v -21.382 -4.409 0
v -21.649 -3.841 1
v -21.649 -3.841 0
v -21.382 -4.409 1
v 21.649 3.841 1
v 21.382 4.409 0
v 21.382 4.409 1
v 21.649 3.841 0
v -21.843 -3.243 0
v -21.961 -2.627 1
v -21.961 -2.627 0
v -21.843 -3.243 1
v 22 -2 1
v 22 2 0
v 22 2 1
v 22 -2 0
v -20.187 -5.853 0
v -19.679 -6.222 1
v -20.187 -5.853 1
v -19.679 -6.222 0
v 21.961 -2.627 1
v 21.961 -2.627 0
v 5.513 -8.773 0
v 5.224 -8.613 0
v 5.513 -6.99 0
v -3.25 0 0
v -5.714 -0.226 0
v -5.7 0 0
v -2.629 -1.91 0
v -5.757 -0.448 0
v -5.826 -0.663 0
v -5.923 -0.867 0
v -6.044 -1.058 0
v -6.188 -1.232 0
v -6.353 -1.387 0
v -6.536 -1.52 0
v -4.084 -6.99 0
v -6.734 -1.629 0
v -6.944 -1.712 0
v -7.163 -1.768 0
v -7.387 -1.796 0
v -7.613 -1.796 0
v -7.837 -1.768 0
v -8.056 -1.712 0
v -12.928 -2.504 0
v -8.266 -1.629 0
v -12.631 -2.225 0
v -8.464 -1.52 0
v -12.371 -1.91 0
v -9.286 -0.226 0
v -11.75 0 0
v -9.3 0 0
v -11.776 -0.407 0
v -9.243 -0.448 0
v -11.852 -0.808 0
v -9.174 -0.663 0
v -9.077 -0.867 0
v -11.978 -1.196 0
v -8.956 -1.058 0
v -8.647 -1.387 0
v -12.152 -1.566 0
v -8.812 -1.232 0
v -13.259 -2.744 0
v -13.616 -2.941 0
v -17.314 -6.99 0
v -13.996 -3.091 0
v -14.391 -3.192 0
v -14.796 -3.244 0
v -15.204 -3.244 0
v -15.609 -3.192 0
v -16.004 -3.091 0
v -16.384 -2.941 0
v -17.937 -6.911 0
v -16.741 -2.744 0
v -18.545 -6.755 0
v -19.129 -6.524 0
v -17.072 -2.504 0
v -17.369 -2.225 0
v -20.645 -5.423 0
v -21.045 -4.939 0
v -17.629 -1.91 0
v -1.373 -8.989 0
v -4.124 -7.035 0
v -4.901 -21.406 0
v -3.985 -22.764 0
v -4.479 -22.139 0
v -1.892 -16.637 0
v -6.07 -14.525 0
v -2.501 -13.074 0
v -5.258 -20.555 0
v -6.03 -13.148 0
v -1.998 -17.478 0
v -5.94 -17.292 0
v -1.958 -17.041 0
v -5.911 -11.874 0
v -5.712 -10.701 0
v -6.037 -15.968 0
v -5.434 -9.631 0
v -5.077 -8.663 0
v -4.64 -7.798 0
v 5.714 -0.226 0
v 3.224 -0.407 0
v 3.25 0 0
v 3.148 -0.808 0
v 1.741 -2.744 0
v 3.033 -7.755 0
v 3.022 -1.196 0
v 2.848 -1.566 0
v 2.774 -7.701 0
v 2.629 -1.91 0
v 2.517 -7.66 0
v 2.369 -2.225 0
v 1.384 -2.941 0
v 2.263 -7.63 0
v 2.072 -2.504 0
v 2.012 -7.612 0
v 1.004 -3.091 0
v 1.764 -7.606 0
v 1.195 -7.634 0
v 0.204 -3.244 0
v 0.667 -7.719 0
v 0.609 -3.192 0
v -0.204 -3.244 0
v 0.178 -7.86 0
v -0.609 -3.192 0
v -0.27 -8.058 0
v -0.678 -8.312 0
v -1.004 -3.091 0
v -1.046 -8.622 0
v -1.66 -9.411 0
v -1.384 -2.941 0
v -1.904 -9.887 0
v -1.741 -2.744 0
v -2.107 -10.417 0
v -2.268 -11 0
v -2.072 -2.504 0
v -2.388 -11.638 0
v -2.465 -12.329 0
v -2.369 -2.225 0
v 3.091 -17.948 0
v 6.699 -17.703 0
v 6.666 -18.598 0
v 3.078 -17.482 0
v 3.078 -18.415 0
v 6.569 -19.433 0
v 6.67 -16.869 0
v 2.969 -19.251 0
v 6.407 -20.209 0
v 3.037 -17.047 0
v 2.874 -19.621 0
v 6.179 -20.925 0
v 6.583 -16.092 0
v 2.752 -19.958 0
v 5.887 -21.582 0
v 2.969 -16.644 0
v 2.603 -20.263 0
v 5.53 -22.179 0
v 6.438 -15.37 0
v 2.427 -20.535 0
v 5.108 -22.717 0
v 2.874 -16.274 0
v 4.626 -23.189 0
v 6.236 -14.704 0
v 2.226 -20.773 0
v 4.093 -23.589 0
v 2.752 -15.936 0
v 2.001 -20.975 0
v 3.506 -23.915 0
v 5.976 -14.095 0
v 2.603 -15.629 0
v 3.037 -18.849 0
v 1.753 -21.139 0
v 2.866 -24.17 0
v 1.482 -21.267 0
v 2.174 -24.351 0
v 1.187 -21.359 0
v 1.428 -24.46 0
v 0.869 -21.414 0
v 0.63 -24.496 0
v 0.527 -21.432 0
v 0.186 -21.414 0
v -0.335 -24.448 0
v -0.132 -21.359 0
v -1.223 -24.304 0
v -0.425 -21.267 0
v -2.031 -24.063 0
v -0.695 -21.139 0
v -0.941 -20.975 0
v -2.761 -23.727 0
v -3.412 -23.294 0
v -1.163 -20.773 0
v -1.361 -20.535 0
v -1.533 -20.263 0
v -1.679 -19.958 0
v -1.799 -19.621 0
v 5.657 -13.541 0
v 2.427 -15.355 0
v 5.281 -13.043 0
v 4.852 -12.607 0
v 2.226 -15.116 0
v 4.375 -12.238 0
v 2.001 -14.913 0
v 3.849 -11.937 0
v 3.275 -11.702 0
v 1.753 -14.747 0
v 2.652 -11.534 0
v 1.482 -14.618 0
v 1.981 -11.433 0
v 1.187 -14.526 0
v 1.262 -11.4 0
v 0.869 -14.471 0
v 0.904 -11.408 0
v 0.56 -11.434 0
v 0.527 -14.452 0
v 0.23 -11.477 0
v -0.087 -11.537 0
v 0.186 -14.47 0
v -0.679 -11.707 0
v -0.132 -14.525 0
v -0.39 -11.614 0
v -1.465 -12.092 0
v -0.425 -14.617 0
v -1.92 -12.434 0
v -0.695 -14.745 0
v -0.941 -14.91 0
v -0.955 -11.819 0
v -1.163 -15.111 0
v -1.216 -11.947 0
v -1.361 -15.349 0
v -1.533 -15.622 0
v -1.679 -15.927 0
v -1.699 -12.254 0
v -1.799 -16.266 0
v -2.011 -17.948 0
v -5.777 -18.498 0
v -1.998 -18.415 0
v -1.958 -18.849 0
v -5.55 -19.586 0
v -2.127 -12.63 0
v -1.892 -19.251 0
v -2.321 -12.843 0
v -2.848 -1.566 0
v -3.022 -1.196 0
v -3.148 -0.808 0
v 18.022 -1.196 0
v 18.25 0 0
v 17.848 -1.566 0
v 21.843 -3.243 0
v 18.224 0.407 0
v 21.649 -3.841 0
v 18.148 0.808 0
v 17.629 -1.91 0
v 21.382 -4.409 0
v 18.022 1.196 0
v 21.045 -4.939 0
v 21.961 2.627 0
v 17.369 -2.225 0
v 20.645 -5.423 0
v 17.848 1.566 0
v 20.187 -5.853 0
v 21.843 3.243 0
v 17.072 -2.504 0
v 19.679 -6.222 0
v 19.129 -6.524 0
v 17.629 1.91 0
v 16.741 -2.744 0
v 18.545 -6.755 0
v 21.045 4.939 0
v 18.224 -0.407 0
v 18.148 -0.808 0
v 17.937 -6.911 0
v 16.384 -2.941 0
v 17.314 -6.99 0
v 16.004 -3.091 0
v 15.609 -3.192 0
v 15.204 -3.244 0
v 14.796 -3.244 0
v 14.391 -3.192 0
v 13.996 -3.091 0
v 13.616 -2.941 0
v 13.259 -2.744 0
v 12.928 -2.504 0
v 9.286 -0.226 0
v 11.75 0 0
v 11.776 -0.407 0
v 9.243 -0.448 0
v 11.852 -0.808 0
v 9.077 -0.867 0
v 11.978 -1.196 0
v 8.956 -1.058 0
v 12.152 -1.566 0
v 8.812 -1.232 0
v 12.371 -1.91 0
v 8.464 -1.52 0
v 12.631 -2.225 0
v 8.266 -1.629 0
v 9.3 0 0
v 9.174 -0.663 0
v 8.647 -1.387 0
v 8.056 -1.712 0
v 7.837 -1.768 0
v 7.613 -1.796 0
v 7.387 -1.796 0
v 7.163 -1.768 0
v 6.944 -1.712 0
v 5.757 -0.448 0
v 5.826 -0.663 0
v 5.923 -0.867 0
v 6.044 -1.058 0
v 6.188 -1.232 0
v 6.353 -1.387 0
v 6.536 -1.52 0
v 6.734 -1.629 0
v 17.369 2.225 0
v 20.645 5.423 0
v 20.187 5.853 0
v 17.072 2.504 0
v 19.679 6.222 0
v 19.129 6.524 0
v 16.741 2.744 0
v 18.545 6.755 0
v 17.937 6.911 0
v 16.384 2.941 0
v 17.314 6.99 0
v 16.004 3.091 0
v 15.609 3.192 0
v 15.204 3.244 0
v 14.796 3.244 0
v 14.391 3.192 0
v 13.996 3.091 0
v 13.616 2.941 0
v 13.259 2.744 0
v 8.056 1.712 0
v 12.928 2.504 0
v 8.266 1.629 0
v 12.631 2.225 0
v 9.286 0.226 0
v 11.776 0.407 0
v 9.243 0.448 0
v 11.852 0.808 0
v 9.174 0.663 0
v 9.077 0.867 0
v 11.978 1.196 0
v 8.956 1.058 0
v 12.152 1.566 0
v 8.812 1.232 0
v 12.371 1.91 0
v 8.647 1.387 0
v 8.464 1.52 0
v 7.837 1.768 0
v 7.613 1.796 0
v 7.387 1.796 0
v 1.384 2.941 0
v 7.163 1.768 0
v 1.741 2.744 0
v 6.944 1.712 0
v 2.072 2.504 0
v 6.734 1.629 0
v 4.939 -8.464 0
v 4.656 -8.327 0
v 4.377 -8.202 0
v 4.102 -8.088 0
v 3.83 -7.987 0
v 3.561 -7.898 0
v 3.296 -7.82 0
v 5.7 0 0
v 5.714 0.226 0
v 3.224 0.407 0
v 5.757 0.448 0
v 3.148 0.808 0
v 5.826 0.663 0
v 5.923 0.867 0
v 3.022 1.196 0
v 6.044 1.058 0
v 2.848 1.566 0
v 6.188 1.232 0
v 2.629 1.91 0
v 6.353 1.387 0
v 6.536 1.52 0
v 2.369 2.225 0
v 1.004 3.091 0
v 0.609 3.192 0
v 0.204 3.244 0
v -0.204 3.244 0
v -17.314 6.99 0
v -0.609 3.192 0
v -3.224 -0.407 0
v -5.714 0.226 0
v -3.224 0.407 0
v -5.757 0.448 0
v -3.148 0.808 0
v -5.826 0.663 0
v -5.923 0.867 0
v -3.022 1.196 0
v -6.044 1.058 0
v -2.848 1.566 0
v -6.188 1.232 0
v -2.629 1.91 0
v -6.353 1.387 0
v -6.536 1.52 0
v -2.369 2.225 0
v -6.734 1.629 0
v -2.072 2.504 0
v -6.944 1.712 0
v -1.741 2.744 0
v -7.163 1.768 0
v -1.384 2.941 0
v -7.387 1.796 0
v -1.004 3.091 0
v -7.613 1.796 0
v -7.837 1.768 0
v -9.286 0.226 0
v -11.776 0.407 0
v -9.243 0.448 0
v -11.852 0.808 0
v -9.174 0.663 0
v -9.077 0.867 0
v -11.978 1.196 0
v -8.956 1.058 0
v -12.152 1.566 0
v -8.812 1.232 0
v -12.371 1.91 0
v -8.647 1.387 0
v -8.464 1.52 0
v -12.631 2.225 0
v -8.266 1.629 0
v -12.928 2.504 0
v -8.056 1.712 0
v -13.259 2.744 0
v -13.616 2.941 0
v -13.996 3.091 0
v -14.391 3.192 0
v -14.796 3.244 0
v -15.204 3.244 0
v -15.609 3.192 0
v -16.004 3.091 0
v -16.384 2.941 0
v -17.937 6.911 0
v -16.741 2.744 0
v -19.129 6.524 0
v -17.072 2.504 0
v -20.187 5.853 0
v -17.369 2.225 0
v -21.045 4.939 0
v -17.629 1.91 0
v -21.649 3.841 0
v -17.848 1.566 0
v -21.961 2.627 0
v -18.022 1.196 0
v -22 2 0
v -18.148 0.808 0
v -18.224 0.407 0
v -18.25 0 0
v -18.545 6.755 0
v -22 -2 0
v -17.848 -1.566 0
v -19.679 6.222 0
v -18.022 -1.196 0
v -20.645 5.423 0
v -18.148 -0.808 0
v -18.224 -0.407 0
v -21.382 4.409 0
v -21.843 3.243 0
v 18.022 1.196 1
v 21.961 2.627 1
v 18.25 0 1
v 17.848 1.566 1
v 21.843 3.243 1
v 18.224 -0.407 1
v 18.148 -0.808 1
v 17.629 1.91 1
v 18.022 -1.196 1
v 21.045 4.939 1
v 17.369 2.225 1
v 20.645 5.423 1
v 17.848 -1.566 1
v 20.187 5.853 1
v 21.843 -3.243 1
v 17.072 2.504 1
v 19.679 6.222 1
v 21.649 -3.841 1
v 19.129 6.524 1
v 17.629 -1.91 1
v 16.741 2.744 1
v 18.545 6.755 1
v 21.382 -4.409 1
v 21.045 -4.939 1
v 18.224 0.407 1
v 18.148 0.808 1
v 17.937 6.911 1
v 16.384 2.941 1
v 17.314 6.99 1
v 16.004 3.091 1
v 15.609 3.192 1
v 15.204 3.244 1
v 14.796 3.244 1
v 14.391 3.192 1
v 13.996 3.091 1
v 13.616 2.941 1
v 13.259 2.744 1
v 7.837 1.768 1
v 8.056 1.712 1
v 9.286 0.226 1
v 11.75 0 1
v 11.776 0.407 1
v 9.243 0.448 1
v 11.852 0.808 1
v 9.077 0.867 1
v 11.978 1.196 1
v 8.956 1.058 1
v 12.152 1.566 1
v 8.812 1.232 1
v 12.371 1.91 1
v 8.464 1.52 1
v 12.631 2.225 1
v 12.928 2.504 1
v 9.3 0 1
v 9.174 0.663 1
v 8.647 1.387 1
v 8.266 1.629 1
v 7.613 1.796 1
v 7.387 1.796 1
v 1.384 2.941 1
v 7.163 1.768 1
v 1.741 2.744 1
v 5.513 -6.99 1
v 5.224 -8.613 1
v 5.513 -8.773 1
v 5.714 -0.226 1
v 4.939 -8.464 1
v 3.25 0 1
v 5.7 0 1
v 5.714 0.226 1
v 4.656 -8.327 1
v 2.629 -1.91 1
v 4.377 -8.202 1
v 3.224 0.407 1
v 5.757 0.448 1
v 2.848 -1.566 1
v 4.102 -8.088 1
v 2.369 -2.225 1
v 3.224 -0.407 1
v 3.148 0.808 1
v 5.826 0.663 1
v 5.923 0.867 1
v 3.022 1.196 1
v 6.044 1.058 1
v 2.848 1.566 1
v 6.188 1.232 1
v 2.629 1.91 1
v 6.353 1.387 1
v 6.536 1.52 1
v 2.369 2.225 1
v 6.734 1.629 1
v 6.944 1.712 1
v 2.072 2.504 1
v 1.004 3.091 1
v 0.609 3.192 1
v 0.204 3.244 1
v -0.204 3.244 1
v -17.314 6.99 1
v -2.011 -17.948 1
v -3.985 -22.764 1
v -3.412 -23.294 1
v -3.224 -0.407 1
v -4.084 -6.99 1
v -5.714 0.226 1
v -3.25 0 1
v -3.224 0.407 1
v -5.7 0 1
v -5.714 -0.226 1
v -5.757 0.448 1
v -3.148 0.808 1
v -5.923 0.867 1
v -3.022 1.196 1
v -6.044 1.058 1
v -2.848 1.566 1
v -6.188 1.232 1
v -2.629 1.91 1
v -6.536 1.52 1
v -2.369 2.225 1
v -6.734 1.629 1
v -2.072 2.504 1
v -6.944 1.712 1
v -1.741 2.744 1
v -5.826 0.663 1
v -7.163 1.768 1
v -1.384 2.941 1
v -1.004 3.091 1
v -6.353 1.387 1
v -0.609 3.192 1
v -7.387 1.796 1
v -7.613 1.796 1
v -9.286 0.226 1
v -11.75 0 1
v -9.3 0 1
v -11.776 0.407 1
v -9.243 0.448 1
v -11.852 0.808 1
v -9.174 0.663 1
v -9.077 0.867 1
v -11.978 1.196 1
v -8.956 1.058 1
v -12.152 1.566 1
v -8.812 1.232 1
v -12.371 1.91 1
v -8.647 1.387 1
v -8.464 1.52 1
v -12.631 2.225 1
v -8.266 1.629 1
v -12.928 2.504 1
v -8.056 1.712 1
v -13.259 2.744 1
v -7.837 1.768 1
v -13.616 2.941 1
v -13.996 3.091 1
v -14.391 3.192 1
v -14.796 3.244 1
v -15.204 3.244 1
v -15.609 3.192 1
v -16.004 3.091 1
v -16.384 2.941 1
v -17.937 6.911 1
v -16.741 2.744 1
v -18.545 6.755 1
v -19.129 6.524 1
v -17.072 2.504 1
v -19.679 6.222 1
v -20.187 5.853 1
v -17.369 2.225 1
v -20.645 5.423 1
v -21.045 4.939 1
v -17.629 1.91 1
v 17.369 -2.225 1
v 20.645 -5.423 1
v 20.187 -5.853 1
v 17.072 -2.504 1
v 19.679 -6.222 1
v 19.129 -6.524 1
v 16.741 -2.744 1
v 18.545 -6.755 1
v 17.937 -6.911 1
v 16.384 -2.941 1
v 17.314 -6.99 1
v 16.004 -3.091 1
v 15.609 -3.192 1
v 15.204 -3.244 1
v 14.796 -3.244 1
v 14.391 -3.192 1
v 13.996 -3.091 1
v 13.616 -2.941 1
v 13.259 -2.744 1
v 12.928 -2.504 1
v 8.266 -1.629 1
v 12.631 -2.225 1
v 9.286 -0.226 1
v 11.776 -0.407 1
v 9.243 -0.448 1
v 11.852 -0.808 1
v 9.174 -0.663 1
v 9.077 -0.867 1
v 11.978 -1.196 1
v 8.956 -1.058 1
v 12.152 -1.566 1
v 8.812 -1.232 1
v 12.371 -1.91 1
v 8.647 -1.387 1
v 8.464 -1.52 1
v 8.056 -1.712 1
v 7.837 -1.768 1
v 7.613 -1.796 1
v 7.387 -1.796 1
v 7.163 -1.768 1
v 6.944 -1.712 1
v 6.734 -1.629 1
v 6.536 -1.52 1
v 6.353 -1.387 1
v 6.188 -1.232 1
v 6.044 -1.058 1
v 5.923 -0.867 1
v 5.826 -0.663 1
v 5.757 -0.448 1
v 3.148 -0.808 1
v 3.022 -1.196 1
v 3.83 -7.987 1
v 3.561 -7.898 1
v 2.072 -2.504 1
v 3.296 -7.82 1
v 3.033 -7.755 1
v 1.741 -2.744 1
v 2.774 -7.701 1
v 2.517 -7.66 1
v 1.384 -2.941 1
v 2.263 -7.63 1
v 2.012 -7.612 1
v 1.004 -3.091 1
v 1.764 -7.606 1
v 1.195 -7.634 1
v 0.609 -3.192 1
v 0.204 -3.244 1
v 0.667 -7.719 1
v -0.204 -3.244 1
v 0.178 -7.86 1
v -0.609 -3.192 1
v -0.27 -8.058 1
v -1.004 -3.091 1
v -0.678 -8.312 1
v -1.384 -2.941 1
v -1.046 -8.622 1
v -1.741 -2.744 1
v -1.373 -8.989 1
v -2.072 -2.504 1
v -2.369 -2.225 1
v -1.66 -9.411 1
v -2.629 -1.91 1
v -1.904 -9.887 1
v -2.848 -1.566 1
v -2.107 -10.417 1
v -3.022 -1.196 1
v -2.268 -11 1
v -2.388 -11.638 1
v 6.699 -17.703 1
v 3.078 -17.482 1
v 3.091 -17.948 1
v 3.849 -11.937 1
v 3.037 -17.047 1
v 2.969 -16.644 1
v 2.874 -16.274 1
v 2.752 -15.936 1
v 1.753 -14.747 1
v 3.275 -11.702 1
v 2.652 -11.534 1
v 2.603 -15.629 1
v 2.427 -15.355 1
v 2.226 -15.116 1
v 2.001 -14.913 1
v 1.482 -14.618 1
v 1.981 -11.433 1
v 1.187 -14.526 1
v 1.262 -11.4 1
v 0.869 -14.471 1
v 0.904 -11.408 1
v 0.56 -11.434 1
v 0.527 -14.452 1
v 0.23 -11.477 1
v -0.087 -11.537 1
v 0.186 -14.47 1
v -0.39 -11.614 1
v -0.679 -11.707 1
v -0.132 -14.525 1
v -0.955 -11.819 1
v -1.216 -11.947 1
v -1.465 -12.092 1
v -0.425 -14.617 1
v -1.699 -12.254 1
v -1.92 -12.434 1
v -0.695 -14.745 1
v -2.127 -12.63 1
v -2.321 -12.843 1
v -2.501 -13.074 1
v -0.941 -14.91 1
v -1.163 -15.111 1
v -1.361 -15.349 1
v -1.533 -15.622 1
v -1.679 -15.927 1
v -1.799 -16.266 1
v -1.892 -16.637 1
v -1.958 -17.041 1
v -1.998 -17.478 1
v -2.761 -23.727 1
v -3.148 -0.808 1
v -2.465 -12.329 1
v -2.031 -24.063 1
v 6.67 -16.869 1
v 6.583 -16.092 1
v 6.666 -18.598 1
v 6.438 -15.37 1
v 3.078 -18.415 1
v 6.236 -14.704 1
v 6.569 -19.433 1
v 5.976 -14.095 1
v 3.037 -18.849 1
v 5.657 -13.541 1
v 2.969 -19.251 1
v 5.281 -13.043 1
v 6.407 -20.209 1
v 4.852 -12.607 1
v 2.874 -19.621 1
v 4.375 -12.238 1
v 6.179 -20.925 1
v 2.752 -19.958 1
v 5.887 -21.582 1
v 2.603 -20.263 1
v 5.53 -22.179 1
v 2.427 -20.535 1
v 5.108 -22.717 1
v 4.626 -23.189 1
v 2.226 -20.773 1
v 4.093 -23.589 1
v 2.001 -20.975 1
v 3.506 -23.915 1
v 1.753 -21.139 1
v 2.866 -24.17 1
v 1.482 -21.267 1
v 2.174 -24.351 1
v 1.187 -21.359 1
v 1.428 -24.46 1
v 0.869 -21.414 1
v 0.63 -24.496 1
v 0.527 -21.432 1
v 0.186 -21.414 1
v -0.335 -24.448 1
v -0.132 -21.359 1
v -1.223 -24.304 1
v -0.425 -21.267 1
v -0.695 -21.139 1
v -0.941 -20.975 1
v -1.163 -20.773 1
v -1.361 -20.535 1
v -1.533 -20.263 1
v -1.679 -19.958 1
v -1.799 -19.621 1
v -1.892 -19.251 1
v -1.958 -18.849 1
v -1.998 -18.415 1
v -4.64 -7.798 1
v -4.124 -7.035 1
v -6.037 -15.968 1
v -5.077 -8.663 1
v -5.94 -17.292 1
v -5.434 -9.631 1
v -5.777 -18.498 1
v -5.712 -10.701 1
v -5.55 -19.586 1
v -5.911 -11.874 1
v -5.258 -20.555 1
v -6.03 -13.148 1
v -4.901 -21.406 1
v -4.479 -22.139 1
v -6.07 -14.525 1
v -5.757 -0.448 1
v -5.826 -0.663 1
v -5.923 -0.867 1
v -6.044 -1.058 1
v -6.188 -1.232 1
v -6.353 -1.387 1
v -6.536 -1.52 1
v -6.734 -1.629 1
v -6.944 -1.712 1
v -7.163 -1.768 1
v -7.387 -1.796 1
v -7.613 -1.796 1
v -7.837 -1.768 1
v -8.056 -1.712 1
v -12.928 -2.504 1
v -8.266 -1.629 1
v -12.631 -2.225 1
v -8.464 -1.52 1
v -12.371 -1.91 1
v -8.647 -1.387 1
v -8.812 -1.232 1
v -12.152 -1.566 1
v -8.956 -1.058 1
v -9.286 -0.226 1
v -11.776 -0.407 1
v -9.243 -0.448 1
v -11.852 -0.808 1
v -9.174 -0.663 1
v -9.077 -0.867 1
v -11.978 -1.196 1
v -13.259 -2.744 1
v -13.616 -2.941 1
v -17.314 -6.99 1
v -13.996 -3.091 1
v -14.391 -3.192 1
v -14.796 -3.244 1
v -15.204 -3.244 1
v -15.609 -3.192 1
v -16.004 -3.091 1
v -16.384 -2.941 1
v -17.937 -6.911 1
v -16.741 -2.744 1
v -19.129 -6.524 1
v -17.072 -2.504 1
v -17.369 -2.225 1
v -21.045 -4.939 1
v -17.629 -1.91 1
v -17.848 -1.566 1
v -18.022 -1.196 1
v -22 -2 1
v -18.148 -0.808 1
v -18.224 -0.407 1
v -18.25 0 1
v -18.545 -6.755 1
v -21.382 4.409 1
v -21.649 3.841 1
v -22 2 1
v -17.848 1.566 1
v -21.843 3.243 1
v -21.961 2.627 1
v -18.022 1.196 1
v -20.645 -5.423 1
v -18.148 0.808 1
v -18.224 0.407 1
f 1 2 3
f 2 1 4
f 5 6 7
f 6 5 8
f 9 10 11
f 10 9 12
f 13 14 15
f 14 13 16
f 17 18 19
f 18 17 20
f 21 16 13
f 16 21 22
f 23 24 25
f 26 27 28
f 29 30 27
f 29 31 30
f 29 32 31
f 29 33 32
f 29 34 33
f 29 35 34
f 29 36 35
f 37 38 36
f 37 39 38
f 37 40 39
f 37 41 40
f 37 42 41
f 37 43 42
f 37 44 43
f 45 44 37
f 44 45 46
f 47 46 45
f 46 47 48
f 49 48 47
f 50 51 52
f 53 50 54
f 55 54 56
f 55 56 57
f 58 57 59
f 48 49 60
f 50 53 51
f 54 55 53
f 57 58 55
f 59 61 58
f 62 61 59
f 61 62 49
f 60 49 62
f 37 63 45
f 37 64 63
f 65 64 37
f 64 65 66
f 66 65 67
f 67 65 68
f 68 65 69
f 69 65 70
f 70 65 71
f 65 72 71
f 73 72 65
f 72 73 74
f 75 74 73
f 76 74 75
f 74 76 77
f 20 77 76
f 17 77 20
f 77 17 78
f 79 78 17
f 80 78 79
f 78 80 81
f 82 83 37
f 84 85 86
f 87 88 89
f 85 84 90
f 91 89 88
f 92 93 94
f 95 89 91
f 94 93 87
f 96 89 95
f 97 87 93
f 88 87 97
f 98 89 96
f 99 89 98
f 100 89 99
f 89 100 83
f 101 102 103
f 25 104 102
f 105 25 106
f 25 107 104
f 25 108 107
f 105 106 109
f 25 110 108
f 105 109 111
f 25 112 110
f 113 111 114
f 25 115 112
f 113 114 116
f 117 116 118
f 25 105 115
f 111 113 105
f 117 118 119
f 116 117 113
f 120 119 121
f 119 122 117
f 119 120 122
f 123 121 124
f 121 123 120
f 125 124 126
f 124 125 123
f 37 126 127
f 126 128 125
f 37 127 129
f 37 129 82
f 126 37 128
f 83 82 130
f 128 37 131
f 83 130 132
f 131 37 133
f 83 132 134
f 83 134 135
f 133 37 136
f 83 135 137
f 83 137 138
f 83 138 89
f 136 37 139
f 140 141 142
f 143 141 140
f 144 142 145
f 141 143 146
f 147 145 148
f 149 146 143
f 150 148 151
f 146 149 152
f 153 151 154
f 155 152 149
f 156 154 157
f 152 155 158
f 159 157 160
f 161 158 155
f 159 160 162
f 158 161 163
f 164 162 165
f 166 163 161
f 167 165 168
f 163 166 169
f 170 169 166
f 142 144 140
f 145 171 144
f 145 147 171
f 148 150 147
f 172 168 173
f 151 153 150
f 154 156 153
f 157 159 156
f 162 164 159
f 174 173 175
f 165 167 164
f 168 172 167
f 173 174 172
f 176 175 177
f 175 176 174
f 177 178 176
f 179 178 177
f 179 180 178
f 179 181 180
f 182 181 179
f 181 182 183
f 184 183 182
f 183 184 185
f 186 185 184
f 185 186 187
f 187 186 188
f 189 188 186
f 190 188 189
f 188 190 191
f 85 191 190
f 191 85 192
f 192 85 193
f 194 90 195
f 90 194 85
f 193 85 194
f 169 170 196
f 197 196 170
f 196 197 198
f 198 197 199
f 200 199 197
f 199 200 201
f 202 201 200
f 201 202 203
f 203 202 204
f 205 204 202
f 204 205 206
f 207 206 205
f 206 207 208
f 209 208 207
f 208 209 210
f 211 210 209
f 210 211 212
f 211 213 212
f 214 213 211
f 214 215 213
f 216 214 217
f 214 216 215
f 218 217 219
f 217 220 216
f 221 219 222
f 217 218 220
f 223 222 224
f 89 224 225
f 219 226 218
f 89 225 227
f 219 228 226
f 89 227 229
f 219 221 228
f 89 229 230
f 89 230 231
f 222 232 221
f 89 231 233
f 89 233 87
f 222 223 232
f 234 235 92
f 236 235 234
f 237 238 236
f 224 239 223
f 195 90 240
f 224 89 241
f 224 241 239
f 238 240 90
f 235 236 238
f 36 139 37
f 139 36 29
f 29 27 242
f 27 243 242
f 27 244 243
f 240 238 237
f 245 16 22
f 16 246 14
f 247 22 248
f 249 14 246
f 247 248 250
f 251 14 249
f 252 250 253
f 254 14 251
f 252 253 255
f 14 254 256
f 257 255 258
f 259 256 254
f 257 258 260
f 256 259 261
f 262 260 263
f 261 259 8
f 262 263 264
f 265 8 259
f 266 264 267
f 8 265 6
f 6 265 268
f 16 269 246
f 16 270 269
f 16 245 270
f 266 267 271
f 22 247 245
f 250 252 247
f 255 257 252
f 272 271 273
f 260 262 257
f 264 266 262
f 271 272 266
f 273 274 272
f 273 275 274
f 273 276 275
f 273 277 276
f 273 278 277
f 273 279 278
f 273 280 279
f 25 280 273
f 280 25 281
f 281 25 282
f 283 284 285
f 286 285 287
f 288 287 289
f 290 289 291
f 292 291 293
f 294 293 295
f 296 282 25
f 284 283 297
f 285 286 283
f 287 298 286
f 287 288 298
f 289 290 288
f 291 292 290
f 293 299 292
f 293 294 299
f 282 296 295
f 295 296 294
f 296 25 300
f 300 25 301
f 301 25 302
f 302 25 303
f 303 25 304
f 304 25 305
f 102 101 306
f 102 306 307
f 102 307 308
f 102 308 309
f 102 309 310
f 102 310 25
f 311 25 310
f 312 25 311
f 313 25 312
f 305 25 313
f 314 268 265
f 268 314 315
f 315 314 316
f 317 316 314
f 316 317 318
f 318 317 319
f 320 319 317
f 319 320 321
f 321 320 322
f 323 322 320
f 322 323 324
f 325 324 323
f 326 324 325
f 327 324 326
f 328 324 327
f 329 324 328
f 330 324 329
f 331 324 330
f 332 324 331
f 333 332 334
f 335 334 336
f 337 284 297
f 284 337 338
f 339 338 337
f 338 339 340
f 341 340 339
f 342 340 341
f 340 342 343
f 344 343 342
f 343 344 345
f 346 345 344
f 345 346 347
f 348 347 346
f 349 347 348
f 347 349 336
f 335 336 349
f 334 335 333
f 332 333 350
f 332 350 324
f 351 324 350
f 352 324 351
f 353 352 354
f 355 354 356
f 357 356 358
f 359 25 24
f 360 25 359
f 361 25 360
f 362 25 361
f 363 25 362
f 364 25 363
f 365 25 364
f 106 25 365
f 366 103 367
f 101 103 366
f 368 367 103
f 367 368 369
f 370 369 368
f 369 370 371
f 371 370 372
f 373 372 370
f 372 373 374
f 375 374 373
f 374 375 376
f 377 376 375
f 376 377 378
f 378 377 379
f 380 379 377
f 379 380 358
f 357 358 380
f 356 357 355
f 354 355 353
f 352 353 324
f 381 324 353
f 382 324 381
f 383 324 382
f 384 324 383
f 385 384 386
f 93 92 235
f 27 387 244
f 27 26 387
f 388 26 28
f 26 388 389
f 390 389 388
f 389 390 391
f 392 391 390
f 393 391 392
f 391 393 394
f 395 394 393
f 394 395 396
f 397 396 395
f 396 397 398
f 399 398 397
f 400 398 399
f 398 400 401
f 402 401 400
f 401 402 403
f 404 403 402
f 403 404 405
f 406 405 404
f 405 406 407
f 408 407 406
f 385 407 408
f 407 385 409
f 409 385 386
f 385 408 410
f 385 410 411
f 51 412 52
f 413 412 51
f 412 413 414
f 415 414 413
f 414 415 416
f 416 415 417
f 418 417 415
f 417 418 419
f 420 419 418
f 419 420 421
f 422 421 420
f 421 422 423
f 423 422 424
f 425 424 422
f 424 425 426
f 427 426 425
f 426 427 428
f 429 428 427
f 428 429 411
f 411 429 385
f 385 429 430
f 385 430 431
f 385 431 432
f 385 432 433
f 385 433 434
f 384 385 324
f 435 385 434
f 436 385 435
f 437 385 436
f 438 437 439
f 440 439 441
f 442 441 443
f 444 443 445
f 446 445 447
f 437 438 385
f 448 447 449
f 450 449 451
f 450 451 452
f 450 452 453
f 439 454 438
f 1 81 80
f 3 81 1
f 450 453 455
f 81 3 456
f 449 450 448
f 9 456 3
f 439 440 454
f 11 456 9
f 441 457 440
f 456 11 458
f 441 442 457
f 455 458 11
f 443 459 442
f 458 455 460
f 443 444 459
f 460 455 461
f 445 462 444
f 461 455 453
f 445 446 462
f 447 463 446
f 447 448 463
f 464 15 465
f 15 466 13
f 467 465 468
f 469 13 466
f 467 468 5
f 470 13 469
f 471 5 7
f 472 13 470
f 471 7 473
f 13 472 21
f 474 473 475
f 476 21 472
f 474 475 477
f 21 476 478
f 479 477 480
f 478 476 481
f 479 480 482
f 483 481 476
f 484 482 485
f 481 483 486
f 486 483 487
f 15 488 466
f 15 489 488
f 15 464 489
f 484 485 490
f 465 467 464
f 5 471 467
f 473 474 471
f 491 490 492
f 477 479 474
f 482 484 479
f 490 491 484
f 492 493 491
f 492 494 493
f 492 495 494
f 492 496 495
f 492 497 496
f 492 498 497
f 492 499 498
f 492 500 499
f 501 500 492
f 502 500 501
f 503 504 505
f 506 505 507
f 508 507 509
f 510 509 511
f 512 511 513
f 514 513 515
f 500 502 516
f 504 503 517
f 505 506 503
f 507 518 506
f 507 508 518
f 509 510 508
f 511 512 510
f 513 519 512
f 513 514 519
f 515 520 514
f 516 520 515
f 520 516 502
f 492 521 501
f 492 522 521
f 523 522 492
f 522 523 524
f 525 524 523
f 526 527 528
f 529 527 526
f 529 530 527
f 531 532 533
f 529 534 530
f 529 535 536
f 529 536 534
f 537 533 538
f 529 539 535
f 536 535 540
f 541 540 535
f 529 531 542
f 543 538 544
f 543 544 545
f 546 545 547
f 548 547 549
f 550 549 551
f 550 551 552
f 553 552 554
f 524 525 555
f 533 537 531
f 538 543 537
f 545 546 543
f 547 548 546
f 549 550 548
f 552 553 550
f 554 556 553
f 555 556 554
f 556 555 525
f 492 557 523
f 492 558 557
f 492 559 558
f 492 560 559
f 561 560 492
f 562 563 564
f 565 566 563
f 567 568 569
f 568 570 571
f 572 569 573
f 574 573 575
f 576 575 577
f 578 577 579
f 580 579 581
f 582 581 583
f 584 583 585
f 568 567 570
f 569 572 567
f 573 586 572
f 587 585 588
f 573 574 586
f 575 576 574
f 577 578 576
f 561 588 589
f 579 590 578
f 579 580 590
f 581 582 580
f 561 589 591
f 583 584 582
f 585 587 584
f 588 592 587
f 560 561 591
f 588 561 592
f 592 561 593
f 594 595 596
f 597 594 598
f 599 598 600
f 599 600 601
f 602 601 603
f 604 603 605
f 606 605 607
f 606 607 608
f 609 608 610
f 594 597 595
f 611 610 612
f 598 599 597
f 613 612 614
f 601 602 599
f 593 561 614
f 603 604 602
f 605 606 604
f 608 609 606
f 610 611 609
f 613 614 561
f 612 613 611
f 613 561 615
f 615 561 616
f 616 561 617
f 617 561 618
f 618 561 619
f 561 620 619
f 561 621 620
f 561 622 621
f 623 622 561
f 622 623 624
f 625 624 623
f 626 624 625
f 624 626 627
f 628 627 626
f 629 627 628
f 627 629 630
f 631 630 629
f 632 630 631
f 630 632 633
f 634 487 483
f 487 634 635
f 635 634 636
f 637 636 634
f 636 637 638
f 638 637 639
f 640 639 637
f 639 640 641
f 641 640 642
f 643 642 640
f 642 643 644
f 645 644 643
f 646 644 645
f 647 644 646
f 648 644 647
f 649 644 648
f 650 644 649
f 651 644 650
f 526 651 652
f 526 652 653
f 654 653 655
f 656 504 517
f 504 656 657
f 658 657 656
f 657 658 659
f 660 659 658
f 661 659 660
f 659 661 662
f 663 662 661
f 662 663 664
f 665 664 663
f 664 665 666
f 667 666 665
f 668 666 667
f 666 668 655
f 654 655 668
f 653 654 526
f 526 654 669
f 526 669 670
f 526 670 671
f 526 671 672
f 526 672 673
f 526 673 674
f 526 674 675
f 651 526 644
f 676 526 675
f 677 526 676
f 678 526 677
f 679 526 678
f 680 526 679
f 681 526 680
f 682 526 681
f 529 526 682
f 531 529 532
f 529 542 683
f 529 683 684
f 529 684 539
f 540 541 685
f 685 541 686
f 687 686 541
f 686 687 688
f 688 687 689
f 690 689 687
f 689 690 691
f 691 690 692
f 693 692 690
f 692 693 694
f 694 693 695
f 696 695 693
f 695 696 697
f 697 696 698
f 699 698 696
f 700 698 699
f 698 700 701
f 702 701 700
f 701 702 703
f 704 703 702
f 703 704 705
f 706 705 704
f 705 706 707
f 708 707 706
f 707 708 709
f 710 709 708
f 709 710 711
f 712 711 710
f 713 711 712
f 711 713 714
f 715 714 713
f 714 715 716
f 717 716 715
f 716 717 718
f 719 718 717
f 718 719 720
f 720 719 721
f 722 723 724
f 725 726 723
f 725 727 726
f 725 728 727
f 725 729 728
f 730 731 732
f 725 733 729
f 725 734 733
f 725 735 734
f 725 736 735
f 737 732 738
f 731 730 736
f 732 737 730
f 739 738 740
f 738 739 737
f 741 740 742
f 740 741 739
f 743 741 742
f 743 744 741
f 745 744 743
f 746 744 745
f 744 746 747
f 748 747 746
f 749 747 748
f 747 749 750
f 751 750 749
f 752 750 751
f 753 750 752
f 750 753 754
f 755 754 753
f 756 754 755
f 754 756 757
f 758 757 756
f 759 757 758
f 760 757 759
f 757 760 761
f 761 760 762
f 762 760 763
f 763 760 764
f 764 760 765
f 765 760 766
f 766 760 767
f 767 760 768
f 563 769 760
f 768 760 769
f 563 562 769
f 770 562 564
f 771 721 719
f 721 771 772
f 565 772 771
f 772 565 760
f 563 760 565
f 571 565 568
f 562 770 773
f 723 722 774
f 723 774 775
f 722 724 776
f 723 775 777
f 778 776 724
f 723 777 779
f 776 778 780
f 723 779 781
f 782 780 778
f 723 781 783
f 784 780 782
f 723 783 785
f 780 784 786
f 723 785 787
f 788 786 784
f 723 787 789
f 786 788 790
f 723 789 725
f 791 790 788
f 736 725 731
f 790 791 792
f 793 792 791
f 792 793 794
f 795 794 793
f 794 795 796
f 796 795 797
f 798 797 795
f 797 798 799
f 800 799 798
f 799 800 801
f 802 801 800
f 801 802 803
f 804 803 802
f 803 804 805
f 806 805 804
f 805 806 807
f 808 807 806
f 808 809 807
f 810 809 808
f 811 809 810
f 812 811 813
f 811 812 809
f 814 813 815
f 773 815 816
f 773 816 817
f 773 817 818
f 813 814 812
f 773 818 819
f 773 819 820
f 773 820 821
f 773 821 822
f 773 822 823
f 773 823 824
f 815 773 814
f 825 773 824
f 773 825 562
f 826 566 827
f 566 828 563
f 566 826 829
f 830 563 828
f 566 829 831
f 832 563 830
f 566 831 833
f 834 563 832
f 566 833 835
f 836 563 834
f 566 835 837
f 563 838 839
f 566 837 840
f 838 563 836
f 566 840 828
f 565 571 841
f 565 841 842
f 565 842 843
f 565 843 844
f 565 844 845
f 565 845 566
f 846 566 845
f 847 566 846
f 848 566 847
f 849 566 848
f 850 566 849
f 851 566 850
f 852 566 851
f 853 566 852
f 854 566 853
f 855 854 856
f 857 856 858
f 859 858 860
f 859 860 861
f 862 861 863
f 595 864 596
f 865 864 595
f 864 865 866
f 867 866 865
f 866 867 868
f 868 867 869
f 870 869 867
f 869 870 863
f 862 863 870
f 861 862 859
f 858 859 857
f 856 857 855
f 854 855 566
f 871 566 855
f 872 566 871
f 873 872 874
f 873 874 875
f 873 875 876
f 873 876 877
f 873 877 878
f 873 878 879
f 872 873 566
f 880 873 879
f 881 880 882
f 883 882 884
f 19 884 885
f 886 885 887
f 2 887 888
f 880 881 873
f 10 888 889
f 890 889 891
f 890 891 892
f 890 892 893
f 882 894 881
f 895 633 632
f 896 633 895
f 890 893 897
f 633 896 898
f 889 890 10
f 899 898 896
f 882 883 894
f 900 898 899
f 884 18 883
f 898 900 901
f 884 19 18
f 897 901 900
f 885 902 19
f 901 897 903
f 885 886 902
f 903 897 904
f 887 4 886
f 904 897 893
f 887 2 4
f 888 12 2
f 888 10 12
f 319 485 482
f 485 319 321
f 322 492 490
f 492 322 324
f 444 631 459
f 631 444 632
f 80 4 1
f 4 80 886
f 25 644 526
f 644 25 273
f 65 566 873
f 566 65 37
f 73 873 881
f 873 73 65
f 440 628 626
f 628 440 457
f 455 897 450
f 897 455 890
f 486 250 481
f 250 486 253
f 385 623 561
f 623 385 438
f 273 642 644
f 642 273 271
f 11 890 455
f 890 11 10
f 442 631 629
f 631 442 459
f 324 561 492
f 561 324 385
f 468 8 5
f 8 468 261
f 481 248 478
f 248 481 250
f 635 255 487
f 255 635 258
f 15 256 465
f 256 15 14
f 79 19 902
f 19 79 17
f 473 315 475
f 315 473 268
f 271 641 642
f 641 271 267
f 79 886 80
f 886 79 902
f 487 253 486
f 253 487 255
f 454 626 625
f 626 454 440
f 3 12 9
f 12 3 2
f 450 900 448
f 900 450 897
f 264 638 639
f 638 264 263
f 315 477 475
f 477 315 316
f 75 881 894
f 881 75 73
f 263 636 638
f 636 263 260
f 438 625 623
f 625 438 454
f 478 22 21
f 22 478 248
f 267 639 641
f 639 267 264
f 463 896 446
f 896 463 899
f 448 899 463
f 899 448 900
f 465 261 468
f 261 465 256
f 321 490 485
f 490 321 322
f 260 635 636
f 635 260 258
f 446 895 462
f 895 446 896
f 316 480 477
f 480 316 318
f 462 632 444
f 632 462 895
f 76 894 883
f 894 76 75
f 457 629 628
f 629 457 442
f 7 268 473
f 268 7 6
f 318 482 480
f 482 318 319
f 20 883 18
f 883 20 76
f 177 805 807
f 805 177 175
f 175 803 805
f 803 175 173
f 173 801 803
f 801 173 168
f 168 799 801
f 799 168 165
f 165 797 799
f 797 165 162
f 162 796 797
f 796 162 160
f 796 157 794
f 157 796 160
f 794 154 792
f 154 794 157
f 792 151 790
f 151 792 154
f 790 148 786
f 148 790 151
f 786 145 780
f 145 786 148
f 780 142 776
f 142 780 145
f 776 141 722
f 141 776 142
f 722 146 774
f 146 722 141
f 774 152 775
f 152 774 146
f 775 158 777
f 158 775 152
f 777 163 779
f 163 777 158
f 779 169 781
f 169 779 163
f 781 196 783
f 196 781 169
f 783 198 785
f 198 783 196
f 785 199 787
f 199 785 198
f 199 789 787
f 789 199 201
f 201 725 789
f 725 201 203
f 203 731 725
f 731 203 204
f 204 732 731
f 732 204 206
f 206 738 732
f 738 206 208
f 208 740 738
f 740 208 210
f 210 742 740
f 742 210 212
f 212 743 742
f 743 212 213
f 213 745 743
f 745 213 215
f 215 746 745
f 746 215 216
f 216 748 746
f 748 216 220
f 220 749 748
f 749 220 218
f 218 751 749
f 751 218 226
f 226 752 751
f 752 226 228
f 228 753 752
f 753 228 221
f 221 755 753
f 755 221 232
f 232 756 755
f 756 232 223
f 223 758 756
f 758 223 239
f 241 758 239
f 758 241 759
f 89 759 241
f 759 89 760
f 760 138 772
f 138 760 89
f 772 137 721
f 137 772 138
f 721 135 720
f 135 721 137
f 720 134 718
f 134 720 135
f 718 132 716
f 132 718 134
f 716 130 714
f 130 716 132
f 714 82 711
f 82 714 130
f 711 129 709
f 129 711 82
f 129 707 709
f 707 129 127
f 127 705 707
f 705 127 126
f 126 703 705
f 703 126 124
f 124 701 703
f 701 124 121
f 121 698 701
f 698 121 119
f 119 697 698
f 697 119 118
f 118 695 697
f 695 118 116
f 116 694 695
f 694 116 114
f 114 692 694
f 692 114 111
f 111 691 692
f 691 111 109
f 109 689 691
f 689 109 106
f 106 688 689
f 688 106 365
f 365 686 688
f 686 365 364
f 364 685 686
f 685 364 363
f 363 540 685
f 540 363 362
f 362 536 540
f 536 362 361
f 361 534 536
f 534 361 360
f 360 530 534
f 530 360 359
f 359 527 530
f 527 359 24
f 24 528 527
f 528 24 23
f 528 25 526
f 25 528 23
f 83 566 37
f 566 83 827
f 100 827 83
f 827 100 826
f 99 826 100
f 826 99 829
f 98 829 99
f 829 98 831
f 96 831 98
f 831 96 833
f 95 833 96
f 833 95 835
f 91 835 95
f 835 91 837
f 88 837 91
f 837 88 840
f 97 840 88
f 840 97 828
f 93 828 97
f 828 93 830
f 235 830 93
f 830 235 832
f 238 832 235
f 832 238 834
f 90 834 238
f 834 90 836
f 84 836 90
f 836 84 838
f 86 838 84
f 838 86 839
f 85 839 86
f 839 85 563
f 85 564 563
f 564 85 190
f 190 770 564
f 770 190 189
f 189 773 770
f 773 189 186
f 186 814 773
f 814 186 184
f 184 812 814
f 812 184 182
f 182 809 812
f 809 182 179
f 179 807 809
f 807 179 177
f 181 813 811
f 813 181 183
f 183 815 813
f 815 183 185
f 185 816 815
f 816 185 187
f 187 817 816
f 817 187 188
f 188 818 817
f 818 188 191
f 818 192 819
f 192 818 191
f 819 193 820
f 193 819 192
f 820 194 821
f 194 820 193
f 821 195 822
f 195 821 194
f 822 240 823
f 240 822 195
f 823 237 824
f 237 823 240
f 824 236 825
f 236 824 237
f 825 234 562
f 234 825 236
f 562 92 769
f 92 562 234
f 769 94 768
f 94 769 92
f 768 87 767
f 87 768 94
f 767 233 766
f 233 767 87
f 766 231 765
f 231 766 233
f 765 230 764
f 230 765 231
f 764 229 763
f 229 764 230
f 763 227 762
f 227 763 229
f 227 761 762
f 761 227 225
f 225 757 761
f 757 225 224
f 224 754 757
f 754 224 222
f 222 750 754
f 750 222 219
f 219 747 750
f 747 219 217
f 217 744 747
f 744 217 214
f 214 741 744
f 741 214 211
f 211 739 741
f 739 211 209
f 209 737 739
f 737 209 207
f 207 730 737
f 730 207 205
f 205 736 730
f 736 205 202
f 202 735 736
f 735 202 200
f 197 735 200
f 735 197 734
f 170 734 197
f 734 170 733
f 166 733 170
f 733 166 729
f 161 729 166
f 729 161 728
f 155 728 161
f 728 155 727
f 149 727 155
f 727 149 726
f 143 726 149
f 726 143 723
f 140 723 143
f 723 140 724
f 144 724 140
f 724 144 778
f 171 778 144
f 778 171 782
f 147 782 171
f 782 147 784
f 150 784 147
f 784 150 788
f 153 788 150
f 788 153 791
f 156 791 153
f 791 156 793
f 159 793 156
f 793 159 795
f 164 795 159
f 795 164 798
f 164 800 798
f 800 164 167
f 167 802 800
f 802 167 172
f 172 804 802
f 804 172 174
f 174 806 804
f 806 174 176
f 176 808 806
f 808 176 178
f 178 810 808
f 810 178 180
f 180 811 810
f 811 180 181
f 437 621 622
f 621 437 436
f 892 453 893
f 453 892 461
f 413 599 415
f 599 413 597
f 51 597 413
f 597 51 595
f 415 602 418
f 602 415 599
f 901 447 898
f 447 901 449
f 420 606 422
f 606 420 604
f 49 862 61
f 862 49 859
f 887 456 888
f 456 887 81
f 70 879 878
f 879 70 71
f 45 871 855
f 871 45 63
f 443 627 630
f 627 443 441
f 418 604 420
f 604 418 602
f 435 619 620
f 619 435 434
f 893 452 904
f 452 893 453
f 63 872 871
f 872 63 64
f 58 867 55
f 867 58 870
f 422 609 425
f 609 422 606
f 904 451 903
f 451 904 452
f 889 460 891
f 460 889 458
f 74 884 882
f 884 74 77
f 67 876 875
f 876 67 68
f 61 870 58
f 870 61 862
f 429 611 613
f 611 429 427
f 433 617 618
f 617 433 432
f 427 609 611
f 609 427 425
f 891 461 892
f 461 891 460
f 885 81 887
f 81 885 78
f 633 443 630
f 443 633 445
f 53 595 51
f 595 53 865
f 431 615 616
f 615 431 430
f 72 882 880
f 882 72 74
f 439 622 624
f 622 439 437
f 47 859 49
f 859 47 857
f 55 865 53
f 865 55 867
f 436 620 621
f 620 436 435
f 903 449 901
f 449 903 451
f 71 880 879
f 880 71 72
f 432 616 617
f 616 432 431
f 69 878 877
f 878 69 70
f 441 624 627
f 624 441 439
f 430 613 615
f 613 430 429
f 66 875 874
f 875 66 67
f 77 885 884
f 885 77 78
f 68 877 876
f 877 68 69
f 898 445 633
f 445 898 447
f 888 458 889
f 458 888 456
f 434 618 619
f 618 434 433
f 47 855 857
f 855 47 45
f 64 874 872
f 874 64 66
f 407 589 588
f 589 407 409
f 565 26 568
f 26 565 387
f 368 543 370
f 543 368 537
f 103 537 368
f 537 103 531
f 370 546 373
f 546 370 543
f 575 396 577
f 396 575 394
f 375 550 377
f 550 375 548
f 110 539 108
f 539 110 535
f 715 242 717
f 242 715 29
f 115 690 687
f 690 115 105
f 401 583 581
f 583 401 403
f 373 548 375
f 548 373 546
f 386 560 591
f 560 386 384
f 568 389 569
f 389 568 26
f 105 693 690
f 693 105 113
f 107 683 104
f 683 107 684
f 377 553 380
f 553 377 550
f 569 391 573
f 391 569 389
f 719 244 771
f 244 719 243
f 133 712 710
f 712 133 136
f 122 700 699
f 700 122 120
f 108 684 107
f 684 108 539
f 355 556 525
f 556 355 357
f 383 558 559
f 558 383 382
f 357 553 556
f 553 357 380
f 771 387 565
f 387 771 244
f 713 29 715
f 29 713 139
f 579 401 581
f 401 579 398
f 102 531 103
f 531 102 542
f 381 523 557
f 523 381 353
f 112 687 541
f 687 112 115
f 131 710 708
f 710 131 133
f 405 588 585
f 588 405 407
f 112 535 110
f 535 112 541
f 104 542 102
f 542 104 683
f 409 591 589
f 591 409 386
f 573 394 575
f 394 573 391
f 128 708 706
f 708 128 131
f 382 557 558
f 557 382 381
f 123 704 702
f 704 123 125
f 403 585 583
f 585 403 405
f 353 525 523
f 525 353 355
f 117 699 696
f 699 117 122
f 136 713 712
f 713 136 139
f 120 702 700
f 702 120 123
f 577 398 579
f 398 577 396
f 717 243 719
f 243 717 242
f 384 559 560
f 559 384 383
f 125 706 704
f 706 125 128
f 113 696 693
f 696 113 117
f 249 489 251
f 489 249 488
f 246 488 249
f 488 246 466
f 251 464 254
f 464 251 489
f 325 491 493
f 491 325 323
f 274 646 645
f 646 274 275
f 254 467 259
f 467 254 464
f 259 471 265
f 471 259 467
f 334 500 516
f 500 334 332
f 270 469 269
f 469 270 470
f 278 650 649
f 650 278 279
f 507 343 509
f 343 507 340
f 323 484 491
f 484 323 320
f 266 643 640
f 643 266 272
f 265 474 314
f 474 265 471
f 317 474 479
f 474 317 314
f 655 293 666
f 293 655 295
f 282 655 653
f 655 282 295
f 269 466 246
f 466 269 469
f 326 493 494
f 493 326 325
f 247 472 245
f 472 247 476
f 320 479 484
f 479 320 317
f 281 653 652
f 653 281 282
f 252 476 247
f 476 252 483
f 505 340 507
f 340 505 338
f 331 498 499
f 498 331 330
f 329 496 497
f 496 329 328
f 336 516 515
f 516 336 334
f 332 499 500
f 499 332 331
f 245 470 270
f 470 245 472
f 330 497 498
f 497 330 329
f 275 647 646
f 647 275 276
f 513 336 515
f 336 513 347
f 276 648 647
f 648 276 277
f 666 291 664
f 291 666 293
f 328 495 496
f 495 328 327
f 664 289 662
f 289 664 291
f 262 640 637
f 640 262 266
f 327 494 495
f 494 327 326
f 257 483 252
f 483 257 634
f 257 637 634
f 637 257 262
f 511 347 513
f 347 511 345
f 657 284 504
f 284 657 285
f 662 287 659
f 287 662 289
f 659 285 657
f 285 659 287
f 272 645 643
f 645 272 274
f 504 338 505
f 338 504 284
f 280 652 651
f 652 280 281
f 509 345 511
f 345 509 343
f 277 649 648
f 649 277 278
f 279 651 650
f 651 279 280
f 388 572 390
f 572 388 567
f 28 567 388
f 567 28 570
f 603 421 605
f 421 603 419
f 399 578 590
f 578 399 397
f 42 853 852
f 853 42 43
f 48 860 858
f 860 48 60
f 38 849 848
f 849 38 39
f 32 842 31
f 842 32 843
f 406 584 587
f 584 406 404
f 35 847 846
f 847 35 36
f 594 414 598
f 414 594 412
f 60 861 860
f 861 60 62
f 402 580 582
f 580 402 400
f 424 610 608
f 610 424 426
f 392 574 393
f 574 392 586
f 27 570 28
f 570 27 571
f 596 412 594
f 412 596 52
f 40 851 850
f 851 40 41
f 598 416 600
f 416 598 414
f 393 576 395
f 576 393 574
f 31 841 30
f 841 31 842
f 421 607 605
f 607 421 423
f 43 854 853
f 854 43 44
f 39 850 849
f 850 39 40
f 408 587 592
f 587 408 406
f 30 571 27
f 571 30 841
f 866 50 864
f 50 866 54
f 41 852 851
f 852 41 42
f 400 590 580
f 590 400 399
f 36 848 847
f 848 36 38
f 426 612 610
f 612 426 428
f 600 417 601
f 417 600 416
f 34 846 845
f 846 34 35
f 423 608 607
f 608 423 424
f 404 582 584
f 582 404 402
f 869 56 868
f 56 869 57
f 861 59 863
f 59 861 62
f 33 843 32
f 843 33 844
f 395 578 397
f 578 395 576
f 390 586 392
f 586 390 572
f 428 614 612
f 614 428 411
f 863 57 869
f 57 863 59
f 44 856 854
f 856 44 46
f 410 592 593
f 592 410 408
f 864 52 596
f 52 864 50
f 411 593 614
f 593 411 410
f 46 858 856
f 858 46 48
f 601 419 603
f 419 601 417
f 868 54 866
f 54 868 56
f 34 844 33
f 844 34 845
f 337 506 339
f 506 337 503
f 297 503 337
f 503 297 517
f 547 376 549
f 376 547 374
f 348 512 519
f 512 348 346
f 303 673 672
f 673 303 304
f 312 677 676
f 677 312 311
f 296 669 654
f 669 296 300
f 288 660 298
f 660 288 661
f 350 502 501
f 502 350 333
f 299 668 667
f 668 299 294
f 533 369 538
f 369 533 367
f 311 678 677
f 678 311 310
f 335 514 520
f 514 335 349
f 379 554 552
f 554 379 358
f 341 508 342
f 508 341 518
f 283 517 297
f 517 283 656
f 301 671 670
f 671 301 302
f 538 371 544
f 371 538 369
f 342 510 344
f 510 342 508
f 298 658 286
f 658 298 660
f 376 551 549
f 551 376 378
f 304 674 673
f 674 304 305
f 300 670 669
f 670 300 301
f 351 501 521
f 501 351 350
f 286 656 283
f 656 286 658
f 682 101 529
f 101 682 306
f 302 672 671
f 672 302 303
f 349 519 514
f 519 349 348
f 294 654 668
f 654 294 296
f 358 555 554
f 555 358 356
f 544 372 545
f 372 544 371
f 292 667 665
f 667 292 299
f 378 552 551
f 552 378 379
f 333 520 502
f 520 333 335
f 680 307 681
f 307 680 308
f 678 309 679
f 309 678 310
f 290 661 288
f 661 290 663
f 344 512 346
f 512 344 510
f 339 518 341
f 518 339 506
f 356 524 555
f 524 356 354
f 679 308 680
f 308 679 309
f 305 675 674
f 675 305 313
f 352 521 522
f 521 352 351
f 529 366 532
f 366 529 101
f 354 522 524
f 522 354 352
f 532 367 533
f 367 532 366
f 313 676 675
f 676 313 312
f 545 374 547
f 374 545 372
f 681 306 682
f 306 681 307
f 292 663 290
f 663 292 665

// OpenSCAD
$fn = 50;


difference() {
	union() {
		hull() {
			translate(v = [-17.0000000000, 2.0000000000, 0]) {
				cylinder(h = 1, r = 5);
			}
			translate(v = [17.0000000000, 2.0000000000, 0]) {
				cylinder(h = 1, r = 5);
			}
			translate(v = [-17.0000000000, -2.0000000000, 0]) {
				cylinder(h = 1, r = 5);
			}
			translate(v = [17.0000000000, -2.0000000000, 0]) {
				cylinder(h = 1, r = 5);
			}
		}
		translate(v = [0, -5, 0]) {
			linear_extrude(height = 1) {
				text(font = "DejaVu Sans Mono:style=Bold", halign = "center", size = 19.0000000000, text = "6", valign = "top");
			}
		}
	}
	union() {
		translate(v = [-15.0000000000, 0.0000000000, 0]) {
			translate(v = [0, 0, -100]) {
				cylinder(h = 200, r = 3.2500000000);
			}
		}
		translate(v = [0, 0, -100]) {
			cylinder(h = 200, r = 3.2500000000);
		}
		translate(v = [15.0000000000, 0.0000000000, 0]) {
			translate(v = [0, 0, -100]) {
				cylinder(h = 200, r = 3.2500000000);
			}
		}
		translate(v = [-15.0000000000, 0.0000000000, 0]) {
			translate(v = [0, 0, -100]) {
				cylinder(h = 200, r = 1.8000000000);
			}
		}
		translate(v = [-7.5000000000, 0.0000000000, 0]) {
			translate(v = [0, 0, -100]) {
				cylinder(h = 200, r = 1.8000000000);
			}
		}
		translate(v = [0, 0, -100]) {
			cylinder(h = 200, r = 1.8000000000);
		}
		translate(v = [7.5000000000, 0.0000000000, 0]) {
			translate(v = [0, 0, -100]) {
				cylinder(h = 200, r = 1.8000000000);
			}
		}
		translate(v = [15.0000000000, 0.0000000000, 0]) {
			translate(v = [0, 0, -100]) {
				cylinder(h = 200, r = 1.8000000000);
			}
		}
	}
}
